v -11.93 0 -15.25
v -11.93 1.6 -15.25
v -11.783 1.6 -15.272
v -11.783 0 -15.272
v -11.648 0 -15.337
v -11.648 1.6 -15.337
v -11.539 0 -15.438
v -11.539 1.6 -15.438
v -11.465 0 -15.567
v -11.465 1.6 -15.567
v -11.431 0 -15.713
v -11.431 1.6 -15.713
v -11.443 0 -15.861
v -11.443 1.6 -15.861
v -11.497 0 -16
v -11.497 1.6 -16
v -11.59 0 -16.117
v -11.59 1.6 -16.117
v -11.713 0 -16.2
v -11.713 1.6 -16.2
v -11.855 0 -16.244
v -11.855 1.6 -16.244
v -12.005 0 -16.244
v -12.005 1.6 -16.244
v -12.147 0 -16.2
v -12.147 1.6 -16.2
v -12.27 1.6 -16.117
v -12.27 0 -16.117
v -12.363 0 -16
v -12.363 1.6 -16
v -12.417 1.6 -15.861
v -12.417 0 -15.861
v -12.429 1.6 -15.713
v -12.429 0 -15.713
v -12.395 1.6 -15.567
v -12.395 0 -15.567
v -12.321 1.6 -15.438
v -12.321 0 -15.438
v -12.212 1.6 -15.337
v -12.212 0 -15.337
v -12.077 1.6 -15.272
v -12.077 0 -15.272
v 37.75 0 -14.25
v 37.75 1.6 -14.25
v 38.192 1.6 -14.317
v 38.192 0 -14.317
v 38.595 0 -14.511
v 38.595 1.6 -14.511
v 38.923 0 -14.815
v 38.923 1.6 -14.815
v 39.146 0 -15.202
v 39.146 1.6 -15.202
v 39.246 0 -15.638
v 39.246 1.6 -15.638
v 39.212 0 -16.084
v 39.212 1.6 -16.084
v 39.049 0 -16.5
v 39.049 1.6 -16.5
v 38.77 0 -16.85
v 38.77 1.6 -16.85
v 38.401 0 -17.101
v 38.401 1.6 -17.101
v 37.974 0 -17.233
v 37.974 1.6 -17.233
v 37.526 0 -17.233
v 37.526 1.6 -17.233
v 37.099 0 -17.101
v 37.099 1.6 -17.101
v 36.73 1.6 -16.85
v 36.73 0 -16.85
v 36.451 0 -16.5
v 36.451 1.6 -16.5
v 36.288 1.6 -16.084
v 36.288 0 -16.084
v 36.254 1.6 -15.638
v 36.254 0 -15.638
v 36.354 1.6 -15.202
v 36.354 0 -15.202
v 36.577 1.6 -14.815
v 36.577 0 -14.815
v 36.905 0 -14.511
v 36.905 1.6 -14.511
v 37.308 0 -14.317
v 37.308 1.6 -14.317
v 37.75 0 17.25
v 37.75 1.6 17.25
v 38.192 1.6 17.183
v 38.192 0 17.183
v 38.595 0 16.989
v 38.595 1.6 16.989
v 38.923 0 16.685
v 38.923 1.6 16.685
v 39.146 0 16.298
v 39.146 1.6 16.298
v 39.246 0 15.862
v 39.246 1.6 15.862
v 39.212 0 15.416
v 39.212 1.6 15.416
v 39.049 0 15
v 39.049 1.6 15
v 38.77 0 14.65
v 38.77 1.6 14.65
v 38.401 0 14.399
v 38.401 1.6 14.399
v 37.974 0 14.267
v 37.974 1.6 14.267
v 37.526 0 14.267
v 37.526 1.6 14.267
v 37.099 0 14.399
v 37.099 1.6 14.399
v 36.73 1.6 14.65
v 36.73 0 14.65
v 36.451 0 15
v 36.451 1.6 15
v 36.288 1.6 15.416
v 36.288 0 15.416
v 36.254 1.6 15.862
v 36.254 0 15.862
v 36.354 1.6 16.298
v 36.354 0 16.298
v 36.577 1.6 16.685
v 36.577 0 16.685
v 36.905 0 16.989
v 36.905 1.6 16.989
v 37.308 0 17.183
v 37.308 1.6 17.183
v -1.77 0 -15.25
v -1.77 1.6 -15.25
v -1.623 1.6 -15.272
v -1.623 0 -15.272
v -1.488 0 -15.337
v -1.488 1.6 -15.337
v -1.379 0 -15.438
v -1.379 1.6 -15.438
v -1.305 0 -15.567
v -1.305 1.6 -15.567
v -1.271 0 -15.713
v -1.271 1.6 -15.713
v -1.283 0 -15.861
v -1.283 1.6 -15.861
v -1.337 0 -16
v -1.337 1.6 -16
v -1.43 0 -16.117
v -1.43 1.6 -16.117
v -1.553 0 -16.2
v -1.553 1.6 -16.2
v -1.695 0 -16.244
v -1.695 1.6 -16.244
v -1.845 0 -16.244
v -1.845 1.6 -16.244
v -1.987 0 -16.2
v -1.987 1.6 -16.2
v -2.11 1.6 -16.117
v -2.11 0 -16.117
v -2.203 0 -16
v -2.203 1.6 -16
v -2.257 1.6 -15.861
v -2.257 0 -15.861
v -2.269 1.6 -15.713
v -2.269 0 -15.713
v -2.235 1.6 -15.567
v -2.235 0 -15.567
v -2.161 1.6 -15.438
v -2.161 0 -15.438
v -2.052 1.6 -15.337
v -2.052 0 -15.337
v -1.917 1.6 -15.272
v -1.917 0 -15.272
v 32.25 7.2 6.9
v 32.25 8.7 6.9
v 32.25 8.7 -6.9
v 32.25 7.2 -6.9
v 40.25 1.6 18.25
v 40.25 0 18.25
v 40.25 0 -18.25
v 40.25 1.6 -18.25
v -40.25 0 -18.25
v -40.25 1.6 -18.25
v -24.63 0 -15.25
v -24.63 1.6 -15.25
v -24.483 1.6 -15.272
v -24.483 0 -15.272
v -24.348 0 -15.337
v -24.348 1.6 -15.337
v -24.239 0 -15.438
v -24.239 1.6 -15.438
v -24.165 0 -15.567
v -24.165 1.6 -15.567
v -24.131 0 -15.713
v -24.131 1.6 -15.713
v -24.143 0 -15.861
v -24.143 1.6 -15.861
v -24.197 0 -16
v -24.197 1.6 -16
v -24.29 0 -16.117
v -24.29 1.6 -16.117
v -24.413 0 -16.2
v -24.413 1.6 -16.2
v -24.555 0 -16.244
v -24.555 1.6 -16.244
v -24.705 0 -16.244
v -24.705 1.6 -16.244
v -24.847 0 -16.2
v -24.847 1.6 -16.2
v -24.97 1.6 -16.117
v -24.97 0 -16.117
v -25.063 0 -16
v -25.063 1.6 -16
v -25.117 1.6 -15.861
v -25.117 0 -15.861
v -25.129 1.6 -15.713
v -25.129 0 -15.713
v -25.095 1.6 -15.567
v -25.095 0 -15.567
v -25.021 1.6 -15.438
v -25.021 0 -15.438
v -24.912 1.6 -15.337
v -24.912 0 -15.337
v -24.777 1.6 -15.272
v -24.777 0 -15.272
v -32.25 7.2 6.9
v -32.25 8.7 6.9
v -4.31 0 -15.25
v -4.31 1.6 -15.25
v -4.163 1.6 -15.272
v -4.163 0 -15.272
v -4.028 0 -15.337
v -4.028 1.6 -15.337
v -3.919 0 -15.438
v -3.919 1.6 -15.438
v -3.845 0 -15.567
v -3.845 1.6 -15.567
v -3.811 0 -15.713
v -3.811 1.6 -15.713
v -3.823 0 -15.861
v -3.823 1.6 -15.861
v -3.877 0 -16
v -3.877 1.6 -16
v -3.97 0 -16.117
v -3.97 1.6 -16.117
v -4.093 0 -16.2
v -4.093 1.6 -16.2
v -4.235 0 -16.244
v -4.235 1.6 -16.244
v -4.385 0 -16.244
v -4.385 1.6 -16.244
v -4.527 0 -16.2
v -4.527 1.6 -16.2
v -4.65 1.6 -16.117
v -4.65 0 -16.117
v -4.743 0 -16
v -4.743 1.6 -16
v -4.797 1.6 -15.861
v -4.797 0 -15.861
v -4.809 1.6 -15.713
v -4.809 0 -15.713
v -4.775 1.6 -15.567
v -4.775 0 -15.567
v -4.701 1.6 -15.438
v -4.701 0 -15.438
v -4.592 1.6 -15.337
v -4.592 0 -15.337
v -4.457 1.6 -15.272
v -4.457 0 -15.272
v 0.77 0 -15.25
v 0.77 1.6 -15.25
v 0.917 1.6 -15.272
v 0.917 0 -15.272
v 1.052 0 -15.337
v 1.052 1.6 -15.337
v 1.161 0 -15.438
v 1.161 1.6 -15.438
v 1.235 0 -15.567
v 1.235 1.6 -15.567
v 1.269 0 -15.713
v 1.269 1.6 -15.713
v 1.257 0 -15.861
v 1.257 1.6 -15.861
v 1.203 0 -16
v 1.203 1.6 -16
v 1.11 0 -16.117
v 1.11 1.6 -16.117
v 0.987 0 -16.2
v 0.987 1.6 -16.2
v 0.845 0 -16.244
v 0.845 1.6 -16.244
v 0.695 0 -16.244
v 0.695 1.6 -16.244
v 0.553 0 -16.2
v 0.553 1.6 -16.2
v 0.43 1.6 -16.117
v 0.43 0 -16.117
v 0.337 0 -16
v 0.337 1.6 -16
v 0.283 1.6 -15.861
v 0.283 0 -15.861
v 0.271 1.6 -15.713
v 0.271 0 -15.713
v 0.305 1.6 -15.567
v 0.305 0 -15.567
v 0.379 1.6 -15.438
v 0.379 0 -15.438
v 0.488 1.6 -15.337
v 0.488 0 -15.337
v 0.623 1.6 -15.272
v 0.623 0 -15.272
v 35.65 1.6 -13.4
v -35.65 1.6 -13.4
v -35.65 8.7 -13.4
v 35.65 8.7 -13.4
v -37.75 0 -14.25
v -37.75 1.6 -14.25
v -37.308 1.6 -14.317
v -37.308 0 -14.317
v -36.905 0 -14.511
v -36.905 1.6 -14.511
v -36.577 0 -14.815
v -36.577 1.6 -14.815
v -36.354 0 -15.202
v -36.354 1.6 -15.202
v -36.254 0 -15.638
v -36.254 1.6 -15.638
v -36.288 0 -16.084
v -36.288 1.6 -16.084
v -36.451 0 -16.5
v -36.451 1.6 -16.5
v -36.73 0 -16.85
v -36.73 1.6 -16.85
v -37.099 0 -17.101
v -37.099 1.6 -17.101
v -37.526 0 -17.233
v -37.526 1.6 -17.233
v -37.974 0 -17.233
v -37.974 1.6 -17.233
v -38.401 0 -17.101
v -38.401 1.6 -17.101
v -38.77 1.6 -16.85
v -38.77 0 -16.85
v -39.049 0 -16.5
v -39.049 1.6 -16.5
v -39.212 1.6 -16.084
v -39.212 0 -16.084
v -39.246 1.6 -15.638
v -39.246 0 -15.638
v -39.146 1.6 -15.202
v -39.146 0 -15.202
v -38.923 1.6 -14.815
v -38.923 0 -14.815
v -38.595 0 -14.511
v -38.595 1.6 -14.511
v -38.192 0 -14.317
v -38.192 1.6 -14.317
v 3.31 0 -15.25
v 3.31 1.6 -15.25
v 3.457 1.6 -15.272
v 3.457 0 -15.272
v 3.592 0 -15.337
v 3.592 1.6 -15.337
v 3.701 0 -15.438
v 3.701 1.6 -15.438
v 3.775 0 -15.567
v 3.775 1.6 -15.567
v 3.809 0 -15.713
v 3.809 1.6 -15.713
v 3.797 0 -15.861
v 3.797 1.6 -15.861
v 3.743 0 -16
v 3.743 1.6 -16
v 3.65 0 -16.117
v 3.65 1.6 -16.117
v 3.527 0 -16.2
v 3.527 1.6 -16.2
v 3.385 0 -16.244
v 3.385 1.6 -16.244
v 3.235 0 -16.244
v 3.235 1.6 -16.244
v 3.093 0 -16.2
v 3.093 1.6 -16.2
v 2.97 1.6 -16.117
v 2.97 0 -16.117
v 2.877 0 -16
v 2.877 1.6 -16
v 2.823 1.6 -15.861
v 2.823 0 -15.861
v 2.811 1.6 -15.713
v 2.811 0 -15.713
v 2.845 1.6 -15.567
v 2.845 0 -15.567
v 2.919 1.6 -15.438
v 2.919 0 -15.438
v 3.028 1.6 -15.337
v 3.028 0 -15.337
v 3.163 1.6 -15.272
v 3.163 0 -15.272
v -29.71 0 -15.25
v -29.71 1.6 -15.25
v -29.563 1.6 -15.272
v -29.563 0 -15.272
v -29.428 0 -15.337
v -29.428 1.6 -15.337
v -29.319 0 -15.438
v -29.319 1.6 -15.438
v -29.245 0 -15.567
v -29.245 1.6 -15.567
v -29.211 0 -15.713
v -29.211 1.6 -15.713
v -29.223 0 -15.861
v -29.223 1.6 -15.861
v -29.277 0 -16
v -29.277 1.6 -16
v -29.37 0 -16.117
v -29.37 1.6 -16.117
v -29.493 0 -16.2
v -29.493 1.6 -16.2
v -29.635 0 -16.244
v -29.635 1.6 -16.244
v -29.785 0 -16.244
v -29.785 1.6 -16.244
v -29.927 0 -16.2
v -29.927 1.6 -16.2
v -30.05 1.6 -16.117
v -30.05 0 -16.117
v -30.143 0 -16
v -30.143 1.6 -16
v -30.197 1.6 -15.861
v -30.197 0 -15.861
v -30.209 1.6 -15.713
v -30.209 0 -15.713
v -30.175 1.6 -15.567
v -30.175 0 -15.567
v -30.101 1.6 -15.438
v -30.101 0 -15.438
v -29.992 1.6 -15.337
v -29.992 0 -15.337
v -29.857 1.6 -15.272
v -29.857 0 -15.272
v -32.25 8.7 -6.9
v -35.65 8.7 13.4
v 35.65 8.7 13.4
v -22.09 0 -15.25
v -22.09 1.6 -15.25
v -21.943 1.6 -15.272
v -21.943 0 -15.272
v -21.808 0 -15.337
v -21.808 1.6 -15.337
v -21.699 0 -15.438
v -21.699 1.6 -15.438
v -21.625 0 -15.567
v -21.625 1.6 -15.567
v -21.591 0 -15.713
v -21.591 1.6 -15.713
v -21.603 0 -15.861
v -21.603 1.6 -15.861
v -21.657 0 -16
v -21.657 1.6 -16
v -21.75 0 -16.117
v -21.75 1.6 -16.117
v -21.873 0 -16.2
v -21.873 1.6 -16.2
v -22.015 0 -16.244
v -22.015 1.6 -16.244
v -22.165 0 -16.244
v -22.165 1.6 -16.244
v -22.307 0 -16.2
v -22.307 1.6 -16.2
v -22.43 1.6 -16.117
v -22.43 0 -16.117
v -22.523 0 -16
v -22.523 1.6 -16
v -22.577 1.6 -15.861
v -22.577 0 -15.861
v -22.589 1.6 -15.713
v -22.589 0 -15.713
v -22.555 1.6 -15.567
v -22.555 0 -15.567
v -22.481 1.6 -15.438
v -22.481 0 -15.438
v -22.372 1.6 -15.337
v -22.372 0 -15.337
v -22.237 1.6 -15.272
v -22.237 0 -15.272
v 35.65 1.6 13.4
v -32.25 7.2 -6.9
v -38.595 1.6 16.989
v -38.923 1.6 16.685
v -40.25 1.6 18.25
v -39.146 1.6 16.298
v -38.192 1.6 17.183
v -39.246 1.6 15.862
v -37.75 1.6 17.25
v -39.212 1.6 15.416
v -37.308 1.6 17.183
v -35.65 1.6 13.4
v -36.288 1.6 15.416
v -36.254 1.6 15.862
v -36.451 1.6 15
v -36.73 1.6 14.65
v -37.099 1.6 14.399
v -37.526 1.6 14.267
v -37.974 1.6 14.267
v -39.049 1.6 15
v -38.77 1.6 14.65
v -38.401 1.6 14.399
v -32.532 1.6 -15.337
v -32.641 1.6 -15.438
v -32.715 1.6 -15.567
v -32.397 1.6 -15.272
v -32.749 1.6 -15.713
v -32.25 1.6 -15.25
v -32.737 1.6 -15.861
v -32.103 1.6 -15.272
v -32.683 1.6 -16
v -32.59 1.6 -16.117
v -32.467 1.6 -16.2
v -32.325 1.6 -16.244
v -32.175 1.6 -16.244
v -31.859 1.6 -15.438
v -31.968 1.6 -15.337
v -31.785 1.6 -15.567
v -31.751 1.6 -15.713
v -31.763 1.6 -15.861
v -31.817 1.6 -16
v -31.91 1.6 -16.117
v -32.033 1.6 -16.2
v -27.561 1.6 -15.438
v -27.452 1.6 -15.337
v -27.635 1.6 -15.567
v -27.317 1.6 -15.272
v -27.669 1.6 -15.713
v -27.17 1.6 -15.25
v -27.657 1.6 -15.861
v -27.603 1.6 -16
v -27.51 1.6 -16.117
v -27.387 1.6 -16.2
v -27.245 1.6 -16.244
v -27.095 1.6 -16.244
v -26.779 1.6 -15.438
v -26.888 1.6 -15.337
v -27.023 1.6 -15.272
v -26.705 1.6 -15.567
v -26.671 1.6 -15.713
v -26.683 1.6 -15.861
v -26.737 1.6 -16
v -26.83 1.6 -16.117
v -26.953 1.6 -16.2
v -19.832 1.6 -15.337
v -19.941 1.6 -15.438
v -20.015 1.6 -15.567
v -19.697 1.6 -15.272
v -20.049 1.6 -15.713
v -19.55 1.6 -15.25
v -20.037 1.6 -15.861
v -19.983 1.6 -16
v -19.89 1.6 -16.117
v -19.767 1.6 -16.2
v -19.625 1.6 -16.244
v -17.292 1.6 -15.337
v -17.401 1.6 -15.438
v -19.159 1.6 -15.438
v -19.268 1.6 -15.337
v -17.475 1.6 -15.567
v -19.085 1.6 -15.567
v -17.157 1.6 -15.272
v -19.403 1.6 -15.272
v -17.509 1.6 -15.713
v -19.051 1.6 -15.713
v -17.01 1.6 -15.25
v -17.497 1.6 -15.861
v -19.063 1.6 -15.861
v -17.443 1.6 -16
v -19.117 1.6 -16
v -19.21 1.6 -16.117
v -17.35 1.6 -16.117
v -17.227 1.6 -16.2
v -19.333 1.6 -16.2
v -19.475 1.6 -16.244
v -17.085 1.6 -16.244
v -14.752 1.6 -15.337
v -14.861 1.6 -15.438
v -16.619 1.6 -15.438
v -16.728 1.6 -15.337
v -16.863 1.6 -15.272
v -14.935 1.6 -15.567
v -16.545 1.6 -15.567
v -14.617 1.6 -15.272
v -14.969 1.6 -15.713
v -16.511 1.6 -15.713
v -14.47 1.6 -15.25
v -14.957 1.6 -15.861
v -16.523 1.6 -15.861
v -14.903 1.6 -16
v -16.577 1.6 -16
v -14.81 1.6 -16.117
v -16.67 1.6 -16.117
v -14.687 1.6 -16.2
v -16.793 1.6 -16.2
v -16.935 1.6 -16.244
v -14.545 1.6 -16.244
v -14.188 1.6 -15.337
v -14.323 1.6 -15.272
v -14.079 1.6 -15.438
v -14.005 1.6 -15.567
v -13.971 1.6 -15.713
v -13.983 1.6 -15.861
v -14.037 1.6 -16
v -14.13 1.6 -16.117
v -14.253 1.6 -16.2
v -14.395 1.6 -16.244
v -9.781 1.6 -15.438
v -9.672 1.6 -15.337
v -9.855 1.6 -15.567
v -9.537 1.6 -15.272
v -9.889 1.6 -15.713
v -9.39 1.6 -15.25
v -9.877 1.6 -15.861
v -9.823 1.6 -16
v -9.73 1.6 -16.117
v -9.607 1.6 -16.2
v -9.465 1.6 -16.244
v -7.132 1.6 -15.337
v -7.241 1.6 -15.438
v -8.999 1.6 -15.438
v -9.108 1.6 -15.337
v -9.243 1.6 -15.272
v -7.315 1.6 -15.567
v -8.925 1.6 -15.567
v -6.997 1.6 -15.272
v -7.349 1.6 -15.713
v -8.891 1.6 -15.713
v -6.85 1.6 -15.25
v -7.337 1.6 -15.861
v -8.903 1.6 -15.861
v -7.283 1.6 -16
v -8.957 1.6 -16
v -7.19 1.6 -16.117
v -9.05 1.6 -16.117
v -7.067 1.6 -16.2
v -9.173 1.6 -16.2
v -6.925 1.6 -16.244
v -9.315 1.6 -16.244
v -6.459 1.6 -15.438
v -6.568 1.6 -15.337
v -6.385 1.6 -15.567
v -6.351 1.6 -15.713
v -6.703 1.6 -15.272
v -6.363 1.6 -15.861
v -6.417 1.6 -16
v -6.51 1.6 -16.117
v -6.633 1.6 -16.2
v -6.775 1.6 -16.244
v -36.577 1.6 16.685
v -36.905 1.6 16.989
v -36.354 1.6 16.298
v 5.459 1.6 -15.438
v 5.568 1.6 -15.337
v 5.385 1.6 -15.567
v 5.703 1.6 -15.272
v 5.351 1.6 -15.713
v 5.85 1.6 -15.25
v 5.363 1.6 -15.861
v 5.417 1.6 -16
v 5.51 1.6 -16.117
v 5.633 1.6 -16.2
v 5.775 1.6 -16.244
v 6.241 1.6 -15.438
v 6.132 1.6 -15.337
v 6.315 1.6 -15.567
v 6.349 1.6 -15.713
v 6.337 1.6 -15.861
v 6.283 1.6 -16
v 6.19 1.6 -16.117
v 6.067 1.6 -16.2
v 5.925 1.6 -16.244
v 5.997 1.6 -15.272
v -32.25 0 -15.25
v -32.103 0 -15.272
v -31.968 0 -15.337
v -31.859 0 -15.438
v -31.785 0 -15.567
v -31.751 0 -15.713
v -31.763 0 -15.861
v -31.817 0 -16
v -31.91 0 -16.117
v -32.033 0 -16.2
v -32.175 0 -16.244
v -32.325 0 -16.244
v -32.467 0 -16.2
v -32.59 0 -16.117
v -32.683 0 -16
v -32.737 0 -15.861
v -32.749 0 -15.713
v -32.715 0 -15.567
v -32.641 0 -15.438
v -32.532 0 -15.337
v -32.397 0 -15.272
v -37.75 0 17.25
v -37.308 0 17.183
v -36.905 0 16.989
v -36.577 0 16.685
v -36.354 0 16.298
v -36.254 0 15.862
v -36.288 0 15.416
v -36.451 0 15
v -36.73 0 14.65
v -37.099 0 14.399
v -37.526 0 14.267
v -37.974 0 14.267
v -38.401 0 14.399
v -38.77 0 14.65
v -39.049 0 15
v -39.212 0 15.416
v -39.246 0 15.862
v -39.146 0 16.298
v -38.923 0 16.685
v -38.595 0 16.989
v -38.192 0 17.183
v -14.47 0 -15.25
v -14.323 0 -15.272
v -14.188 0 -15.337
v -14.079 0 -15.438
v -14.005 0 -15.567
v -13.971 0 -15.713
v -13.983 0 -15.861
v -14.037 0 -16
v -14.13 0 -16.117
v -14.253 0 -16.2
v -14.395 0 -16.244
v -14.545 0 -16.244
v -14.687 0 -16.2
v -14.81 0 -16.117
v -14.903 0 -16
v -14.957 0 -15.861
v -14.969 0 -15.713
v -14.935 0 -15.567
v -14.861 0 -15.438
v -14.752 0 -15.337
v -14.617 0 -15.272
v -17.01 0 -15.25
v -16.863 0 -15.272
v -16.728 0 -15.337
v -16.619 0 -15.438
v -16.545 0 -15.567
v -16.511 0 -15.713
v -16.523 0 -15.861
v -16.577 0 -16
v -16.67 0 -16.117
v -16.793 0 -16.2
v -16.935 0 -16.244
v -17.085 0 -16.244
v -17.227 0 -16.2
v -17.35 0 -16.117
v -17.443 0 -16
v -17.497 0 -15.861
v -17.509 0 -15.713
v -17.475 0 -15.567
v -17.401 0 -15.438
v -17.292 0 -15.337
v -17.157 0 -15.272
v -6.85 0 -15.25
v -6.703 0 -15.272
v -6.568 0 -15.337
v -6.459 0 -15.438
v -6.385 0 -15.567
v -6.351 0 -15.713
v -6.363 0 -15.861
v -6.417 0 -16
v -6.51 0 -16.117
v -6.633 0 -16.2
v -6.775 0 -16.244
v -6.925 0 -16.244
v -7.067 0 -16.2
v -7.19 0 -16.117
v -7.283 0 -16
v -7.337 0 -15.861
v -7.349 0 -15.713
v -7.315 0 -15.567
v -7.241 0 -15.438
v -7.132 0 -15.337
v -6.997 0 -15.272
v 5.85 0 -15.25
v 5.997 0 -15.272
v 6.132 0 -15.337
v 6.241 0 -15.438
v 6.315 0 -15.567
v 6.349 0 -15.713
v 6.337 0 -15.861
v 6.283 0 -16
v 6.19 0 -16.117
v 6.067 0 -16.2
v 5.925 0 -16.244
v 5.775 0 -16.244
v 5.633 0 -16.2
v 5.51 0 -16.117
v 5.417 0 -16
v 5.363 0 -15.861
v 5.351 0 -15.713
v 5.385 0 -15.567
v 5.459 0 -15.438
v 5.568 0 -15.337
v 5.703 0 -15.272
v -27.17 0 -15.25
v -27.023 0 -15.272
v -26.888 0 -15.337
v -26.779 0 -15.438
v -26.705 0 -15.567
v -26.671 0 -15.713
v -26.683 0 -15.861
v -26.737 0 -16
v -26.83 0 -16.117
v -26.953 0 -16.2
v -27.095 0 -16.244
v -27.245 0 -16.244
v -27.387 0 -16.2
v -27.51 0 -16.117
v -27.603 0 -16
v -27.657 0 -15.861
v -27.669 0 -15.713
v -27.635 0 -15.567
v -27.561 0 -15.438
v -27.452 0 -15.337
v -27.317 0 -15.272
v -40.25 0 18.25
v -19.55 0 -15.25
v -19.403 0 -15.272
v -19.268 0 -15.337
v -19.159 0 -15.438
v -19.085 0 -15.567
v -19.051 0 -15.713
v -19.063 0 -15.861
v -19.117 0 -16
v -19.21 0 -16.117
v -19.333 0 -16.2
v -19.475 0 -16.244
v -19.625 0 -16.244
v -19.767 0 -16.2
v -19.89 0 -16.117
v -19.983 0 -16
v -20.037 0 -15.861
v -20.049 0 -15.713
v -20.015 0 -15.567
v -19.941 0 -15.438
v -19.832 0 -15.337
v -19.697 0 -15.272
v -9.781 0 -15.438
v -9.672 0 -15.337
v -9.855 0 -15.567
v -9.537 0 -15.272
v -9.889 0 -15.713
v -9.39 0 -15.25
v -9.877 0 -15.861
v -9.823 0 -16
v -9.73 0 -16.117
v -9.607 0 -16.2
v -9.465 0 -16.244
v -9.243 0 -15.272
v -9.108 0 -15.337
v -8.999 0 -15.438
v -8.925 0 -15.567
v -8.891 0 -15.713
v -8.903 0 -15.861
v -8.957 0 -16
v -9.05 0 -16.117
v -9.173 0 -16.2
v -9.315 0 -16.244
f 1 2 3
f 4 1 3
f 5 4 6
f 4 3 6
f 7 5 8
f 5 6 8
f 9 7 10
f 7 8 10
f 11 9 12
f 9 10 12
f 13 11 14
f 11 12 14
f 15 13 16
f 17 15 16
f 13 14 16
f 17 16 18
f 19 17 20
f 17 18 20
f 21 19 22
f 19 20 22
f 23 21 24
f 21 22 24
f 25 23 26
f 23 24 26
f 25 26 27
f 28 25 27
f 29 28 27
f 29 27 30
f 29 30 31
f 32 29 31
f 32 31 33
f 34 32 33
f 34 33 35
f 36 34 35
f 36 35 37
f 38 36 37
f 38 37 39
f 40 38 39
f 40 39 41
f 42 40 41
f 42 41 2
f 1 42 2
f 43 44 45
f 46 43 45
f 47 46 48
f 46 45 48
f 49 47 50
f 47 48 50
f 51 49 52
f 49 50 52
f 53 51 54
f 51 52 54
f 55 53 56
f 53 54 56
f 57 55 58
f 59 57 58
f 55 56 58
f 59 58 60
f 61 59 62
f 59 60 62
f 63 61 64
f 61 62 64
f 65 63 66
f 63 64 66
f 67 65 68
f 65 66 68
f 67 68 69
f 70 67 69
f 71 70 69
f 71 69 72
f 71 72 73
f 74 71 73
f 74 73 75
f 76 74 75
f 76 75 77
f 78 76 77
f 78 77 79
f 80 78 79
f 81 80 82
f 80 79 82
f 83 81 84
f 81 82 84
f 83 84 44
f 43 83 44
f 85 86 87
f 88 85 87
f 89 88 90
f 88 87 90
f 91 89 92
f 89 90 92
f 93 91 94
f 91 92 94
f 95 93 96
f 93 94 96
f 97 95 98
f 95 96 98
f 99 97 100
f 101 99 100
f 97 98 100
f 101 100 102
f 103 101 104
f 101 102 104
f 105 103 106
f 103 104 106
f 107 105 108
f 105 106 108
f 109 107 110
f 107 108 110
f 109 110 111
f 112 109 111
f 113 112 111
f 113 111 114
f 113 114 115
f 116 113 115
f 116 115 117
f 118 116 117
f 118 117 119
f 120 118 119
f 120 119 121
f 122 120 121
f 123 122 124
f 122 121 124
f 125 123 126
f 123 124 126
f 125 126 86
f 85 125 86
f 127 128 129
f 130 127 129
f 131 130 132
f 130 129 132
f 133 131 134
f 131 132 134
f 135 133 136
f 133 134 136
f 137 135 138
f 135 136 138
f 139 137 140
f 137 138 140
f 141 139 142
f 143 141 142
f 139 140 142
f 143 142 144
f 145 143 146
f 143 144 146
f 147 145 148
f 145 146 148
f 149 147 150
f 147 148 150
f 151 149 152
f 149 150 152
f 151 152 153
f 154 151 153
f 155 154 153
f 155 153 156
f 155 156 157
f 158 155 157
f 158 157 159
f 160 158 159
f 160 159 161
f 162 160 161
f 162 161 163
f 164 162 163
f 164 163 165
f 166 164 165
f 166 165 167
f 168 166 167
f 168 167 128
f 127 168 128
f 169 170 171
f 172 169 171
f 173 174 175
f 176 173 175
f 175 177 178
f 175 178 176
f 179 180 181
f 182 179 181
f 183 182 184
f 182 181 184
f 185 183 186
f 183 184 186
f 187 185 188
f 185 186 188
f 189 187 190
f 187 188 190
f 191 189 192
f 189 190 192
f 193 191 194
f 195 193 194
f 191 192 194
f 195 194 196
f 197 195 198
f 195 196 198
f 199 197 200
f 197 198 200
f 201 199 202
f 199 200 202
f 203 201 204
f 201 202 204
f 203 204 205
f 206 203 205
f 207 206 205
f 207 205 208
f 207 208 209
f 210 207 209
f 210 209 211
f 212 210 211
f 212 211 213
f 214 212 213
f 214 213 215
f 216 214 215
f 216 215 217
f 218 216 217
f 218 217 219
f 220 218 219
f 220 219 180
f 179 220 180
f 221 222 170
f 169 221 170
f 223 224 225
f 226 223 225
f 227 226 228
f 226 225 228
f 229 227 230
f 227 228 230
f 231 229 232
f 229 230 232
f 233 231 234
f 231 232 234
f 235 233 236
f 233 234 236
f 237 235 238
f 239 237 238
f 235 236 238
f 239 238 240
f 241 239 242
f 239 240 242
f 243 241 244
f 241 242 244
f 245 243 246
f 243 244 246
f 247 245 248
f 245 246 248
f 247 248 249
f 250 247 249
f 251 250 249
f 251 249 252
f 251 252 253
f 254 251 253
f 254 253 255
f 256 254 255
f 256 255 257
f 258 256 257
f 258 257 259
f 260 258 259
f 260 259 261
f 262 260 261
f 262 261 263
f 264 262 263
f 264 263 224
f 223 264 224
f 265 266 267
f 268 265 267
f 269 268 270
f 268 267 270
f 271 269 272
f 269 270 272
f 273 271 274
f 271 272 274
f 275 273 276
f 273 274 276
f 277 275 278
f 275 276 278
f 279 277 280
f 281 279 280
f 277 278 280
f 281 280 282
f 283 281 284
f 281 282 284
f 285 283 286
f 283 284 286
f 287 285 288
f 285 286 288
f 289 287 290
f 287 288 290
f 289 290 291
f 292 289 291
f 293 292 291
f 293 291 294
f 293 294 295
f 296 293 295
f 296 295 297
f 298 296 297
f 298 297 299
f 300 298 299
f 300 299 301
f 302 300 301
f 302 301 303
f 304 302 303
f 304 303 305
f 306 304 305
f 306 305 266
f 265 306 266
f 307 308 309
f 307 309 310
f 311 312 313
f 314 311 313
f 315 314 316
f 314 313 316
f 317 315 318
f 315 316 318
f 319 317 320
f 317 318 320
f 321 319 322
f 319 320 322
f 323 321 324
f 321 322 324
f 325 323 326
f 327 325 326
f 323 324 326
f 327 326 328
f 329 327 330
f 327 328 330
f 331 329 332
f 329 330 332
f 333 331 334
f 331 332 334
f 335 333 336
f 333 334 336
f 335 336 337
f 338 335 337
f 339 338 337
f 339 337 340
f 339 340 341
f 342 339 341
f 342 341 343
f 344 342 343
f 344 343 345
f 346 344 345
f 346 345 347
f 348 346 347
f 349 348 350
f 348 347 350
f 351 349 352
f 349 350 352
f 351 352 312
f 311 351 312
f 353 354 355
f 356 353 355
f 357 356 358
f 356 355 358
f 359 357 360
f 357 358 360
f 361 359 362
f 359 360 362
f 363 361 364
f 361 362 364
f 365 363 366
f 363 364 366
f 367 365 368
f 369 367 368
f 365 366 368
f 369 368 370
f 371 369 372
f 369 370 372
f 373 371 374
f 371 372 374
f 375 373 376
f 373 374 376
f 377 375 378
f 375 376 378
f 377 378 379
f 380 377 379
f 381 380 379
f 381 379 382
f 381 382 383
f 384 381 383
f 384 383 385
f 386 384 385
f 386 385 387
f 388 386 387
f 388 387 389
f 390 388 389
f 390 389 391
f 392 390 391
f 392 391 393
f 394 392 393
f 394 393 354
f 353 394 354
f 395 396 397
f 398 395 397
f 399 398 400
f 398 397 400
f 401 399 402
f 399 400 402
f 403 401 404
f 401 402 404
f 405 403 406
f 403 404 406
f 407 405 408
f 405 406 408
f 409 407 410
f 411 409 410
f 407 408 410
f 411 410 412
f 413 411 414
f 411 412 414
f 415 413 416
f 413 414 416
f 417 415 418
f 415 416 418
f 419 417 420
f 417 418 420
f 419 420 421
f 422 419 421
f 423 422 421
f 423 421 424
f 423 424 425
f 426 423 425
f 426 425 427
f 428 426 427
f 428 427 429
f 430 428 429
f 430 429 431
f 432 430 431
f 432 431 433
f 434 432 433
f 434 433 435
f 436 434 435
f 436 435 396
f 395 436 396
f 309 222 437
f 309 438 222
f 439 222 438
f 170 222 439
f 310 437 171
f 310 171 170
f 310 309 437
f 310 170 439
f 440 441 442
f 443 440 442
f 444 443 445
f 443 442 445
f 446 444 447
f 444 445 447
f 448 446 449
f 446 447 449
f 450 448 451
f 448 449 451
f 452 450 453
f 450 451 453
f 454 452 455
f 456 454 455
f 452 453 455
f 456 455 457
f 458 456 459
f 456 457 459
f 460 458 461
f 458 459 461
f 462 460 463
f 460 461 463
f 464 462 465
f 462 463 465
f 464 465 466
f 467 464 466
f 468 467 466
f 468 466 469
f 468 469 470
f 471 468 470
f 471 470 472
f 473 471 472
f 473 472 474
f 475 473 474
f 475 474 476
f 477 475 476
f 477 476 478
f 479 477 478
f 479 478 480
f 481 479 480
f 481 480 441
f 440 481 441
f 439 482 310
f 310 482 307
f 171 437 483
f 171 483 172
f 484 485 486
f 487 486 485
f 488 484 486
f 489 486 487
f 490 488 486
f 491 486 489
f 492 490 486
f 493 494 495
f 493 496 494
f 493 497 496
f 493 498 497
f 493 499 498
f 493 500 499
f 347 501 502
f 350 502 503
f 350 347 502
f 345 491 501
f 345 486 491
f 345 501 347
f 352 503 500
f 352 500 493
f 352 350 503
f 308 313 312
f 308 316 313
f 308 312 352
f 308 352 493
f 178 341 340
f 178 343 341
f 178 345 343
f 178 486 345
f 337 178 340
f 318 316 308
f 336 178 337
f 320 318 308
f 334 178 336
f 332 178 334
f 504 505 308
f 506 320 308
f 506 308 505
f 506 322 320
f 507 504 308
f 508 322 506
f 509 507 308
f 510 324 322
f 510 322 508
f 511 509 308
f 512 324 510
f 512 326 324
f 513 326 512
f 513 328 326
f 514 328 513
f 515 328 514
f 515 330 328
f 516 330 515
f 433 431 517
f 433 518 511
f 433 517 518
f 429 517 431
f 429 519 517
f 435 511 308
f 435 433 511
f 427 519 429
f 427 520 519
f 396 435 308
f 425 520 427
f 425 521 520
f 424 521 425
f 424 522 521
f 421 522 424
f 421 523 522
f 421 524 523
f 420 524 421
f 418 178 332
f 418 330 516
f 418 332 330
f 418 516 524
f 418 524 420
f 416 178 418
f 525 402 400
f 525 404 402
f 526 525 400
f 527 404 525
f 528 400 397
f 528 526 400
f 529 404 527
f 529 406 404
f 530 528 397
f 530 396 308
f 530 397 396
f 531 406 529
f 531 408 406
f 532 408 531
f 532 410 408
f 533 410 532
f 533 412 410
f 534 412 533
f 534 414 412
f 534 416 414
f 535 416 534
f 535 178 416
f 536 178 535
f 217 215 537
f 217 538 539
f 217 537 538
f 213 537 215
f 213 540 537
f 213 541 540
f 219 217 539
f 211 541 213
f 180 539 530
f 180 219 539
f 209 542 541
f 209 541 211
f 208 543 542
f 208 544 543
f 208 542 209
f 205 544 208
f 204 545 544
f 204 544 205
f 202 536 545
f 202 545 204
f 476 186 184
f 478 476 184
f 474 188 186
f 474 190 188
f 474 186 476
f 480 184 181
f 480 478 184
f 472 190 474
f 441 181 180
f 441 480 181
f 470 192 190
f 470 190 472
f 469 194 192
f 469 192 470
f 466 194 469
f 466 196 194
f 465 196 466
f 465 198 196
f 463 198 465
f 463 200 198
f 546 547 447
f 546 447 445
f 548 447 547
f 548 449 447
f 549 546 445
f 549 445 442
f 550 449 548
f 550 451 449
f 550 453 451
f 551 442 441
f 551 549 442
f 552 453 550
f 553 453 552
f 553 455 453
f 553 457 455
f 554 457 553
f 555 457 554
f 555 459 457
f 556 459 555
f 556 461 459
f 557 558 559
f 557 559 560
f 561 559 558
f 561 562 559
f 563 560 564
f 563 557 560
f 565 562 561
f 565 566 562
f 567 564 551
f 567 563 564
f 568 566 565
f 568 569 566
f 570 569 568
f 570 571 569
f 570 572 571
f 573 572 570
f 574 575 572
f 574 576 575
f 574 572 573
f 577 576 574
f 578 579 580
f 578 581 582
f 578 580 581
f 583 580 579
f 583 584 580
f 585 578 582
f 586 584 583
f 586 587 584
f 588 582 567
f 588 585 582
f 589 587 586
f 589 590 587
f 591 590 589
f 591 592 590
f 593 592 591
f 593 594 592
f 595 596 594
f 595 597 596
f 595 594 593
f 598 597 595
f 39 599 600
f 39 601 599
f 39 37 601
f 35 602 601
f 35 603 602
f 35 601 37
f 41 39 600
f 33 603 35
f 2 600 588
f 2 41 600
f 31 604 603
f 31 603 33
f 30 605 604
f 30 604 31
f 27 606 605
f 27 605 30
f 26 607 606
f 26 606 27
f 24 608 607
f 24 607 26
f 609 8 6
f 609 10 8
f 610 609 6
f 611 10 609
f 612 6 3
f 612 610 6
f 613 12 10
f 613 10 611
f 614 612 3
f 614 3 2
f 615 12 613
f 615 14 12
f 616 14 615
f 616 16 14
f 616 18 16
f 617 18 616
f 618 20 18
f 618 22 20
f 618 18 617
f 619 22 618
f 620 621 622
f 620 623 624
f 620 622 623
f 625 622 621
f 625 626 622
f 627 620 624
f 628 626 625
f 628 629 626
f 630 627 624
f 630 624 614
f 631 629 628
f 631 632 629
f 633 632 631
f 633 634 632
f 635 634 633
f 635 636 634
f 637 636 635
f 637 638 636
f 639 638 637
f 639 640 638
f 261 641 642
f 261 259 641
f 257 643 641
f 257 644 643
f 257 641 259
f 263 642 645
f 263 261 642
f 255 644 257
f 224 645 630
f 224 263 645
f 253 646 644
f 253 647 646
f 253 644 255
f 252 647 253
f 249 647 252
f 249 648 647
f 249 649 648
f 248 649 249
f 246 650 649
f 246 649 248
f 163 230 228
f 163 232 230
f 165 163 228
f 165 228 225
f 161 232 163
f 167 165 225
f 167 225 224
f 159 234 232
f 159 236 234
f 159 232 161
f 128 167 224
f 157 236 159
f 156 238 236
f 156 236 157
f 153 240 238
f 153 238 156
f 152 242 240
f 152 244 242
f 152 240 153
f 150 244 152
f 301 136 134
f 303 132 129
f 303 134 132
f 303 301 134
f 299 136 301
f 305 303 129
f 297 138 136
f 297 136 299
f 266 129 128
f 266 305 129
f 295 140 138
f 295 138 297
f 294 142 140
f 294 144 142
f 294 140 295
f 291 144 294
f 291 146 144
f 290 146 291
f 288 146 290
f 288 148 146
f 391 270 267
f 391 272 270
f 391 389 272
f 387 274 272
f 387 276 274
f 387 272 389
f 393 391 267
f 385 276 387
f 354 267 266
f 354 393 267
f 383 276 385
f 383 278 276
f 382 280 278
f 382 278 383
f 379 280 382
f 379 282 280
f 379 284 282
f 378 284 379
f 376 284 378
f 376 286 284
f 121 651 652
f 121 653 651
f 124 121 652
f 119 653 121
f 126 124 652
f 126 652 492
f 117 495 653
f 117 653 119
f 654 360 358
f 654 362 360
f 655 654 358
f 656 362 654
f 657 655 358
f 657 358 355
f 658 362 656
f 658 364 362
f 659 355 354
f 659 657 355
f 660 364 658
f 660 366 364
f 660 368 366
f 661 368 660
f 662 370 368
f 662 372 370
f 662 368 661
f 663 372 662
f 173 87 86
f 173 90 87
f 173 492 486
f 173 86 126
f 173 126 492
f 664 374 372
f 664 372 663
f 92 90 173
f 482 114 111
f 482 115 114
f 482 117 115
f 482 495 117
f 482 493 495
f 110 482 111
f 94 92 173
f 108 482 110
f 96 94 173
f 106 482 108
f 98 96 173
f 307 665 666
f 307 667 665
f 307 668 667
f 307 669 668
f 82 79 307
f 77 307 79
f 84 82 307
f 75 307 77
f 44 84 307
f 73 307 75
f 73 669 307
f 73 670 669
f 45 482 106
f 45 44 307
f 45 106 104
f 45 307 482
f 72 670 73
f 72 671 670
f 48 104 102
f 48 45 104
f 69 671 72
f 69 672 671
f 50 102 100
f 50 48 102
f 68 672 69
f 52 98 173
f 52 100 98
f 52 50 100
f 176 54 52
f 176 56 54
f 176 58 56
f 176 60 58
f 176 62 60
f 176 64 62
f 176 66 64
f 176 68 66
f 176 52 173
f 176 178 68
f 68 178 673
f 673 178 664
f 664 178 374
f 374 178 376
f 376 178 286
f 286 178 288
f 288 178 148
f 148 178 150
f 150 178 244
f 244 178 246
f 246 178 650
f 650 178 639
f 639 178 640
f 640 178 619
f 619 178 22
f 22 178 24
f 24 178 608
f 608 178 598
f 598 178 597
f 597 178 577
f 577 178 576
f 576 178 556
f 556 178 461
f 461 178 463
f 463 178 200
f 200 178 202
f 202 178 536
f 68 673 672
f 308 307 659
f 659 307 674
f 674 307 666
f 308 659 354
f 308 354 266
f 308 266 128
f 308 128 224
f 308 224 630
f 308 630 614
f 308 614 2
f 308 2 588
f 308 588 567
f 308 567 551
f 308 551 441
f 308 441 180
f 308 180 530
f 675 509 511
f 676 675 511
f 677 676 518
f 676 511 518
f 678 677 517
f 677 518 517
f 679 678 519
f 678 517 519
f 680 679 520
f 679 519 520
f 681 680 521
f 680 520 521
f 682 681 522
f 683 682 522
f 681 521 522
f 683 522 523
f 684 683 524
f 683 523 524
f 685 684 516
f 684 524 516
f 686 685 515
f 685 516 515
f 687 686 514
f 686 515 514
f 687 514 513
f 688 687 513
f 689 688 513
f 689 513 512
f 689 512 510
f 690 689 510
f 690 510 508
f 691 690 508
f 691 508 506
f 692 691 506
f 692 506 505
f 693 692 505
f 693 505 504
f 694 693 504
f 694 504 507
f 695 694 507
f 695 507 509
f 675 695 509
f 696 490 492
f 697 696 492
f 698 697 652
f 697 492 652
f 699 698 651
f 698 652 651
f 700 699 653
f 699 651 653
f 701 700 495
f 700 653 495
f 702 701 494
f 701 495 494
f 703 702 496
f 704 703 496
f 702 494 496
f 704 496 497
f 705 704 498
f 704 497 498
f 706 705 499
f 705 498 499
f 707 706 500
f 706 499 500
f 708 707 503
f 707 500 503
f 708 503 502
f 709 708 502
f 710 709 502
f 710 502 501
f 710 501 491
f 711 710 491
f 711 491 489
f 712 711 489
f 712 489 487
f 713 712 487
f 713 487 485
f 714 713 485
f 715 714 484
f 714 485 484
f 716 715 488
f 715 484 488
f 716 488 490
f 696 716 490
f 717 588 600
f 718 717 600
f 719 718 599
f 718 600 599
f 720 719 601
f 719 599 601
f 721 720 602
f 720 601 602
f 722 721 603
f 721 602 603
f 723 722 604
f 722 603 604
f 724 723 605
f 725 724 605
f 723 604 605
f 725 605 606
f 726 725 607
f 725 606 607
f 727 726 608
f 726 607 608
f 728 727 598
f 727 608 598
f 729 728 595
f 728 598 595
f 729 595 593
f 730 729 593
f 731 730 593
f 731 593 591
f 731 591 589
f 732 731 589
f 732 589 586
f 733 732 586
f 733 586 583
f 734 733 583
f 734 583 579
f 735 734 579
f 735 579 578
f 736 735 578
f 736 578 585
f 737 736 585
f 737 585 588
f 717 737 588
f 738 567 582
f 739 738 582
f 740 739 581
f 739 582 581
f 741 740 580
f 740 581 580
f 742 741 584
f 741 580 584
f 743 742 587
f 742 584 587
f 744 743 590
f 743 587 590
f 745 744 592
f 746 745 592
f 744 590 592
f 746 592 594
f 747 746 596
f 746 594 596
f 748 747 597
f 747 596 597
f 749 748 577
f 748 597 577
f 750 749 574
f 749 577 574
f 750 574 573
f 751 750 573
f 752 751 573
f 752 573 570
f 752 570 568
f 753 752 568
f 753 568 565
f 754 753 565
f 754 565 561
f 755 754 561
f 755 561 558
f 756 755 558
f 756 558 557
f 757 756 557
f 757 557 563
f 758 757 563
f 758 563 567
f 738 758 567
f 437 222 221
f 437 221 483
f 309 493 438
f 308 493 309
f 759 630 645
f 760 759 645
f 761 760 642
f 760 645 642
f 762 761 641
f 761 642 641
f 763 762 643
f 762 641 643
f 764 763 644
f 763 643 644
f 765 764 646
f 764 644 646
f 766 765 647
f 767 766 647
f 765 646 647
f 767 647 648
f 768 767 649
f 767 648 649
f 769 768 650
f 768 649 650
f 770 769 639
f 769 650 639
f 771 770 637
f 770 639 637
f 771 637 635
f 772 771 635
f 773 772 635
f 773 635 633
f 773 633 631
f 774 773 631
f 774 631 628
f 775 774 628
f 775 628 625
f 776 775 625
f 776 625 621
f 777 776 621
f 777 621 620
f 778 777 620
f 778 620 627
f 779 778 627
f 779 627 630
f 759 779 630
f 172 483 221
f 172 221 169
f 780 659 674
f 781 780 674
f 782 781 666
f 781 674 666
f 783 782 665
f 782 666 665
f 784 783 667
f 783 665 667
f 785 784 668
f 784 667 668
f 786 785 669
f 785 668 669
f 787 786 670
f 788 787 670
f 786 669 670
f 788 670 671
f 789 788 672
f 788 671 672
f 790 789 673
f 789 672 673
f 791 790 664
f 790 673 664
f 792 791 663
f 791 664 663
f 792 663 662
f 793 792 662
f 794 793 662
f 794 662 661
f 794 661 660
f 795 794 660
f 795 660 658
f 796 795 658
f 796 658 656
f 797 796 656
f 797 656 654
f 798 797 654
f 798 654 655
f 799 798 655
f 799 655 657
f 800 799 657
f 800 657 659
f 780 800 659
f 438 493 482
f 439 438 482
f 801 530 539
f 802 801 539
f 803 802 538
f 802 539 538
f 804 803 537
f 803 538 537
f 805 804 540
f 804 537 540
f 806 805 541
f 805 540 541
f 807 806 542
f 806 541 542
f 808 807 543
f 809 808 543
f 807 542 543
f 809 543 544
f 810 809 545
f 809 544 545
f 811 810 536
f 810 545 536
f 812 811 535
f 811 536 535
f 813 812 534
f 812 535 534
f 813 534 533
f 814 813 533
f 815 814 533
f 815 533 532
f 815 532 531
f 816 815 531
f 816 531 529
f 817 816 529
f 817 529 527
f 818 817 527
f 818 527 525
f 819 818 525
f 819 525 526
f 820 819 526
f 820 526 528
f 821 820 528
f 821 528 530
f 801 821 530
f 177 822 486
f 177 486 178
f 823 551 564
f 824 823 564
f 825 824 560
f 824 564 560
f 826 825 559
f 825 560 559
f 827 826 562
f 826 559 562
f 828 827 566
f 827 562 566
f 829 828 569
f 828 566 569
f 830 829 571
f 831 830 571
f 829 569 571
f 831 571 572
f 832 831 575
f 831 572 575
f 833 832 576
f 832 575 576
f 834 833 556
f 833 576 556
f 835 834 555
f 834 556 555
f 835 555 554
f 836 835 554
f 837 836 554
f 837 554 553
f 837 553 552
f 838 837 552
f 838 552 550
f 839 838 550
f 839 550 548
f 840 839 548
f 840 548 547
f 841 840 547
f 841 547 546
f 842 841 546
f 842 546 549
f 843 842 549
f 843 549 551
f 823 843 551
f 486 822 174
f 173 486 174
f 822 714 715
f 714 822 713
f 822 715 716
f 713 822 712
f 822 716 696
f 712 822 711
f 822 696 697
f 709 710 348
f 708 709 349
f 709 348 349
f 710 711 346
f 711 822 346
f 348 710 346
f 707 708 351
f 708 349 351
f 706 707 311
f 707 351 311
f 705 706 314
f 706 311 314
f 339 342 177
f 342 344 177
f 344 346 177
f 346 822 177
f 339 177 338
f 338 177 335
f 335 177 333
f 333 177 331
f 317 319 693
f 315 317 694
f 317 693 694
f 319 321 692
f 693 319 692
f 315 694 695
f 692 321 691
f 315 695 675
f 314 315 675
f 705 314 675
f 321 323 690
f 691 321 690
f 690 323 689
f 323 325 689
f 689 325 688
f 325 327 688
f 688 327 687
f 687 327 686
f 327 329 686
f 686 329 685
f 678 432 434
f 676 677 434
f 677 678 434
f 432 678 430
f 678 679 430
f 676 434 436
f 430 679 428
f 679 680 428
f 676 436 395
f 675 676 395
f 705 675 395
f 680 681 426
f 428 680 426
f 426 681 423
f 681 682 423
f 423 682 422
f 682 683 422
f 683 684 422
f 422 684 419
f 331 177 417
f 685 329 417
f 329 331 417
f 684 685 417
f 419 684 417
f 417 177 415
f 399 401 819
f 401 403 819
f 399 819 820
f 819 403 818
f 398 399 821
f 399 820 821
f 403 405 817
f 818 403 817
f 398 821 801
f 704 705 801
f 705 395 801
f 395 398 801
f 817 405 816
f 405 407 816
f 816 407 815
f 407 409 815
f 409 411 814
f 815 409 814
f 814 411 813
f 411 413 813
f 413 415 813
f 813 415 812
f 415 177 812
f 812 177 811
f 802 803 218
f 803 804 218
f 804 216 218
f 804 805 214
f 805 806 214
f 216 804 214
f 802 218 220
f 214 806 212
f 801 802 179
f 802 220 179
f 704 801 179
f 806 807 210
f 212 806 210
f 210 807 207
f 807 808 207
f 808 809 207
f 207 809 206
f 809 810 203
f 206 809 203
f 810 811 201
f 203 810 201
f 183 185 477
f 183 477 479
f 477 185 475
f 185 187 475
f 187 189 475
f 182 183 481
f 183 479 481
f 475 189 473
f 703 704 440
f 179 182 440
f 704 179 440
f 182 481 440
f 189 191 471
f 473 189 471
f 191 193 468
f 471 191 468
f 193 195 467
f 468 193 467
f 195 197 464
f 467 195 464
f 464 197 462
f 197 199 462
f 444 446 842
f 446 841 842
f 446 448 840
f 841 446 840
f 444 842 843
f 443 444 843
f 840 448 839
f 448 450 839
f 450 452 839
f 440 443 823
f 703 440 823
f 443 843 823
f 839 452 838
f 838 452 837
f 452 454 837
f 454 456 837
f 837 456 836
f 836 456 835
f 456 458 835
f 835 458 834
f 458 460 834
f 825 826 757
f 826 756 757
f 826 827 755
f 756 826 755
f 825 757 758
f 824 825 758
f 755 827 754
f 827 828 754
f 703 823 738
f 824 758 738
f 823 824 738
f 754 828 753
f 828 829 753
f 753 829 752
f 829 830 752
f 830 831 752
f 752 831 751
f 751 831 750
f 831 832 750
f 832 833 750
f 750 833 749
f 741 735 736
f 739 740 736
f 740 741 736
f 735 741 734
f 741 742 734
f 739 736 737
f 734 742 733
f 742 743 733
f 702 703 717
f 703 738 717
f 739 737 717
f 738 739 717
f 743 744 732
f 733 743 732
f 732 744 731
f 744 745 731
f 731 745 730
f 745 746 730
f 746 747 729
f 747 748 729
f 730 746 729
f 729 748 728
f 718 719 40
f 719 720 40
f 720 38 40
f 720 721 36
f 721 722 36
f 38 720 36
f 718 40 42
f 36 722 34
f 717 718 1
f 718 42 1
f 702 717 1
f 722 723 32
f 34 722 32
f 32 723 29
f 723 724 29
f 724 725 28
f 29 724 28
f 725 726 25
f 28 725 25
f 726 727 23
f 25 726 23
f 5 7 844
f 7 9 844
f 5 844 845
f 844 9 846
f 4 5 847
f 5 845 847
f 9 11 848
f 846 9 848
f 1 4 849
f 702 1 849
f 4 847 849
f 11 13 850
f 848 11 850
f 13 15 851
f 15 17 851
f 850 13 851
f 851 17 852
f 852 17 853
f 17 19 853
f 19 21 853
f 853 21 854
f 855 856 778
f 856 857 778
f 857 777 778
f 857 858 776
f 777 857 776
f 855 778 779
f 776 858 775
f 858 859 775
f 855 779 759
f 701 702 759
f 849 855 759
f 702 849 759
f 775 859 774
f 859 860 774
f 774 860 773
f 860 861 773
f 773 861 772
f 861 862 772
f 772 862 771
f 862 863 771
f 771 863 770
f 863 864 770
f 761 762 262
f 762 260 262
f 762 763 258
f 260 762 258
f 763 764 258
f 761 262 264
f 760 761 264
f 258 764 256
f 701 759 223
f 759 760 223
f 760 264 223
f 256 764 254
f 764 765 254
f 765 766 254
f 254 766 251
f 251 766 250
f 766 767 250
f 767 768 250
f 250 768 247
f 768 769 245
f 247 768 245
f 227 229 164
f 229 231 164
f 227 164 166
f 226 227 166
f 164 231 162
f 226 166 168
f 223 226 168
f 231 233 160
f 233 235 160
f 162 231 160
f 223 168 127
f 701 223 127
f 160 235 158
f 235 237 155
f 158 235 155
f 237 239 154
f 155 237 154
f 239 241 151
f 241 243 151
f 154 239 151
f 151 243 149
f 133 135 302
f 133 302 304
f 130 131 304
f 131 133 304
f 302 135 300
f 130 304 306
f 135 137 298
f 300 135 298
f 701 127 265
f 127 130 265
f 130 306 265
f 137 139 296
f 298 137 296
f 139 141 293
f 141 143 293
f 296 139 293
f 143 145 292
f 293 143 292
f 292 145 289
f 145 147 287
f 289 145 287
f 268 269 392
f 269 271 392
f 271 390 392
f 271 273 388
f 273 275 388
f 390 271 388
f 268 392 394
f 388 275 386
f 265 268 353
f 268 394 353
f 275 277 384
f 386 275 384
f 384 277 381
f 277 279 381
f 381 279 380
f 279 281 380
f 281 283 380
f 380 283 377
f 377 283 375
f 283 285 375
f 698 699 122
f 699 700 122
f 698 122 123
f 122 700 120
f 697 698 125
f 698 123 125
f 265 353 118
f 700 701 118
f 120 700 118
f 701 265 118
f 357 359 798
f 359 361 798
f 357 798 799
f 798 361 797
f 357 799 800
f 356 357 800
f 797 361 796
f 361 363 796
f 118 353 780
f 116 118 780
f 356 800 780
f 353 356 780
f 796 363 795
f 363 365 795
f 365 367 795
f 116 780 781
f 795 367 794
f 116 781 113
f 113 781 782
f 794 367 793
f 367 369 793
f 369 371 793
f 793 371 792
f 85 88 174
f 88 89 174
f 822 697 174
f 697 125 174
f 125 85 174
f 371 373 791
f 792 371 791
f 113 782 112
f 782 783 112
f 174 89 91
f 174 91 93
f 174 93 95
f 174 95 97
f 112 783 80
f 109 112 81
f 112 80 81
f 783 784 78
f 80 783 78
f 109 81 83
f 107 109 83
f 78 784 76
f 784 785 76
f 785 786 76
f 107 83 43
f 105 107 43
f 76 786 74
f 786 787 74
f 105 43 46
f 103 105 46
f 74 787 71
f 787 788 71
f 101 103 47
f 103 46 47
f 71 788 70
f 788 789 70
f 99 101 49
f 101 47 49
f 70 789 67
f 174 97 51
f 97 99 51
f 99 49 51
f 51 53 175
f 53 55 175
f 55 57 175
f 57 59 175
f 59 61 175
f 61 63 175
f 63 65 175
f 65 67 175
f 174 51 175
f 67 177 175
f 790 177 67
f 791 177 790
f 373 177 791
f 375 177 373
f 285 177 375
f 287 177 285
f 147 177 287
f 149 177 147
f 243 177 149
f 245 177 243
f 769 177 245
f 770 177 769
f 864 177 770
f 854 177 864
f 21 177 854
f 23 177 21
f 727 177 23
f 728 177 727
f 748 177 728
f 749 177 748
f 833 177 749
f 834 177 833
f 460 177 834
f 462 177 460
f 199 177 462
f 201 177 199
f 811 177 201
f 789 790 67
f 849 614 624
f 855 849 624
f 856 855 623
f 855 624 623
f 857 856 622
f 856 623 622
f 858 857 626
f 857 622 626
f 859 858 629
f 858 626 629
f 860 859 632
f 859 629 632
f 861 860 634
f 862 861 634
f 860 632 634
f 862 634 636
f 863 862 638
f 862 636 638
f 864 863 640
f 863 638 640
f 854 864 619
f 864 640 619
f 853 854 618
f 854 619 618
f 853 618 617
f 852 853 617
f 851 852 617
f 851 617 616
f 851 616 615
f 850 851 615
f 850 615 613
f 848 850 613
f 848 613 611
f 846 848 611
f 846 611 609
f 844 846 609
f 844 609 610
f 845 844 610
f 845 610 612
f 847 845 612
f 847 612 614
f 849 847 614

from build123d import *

# Parameters (mm, degrees)
SKETCH1_W           = 80.5
SKETCH1_H           = 36.5
BOSS_EXTRUDE1_DEPTH = 1.6
SKETCH2_R           = 1.5
CUT_EXTRUDE1_DEPTH  = 1.6
SKETCH3_W           = 71.3
SKETCH3_H           = 26.799999994
BOSS_EXTRUDE2_DEPTH = 7.1
SKETCH4_R           = 0.5
CUT_EXTRUDE2_DEPTH  = 7.1
SKETCH5_W           = 64.5
SKETCH5_H           = 13.8
CUT_EXTRUDE3_DEPTH  = 1.5


with BuildPart() as part:
    # Sketch1 → Boss-Extrude1 (new body)
    with BuildSketch(Plane(origin=(0, 0, 0), x_dir=(1, 0, 0), z_dir=(0, 1, 0))):
        Rectangle(SKETCH1_W, SKETCH1_H)
    extrude(amount=BOSS_EXTRUDE1_DEPTH)

    # Sketch2 → Cut-Extrude1 (cut)
    with BuildSketch(Plane(origin=(0, 1.6, 0), x_dir=(1, 0, 0), z_dir=(0, 1, 0))):
        with Locations(Location((-37.75, 15.75, 0), (0, 0, 270))):
            Circle(SKETCH2_R)
        with Locations(Location((-37.75, -15.75, 0), (0, 0, 270))):
            Circle(SKETCH2_R)
        with Locations(Location((37.75, 15.75, 0), (0, 0, 270))):
            Circle(SKETCH2_R)
        with Locations(Location((37.75, -15.75, 0), (0, 0, 270))):
            Circle(SKETCH2_R)
    extrude(amount=-CUT_EXTRUDE1_DEPTH, mode=Mode.SUBTRACT)

    # Sketch3 → Boss-Extrude2 (add)
    with BuildSketch(Plane(origin=(0, 1.6, 0), x_dir=(1, 0, 0), z_dir=(0, 1, 0))):
        Rectangle(SKETCH3_W, SKETCH3_H)
    extrude(amount=BOSS_EXTRUDE2_DEPTH)

    # Sketch4 → Cut-Extrude2 (cut)
    with BuildSketch(Plane(origin=(0, 1.6, 0), x_dir=(1, 0, 0), z_dir=(0, 1, 0))):
        with Locations(Location((-32.25, 15.75, 0), (0, 0, 270))):
            Circle(SKETCH4_R)
        with Locations(Location((-29.71, 15.75, 0), (0, 0, 270))):
            Circle(SKETCH4_R)
        with Locations(Location((-27.17, 15.75, 0), (0, 0, 270))):
            Circle(SKETCH4_R)
        with Locations(Location((-24.63, 15.75, 0), (0, 0, 270))):
            Circle(SKETCH4_R)
        with Locations(Location((-22.09, 15.75, 0), (0, 0, 270))):
            Circle(SKETCH4_R)
        with Locations(Location((-19.55, 15.75, 0), (0, 0, 270))):
            Circle(SKETCH4_R)
        with Locations(Location((-17.01, 15.75, 0), (0, 0, 270))):
            Circle(SKETCH4_R)
        with Locations(Location((-14.47, 15.75, 0), (0, 0, 270))):
            Circle(SKETCH4_R)
        with Locations(Location((-11.93, 15.75, 0), (0, 0, 270))):
            Circle(SKETCH4_R)
        with Locations(Location((-9.39, 15.75, 0), (0, 0, 270))):
            Circle(SKETCH4_R)
        with Locations(Location((-6.85, 15.75, 0), (0, 0, 270))):
            Circle(SKETCH4_R)
        with Locations(Location((-4.31, 15.75, 0), (0, 0, 270))):
            Circle(SKETCH4_R)
        with Locations(Location((-1.77, 15.75, 0), (0, 0, 270))):
            Circle(SKETCH4_R)
        with Locations(Location((0.77, 15.75, 0), (0, 0, 270))):
            Circle(SKETCH4_R)
        with Locations(Location((3.31, 15.75, 0), (0, 0, 270))):
            Circle(SKETCH4_R)
        with Locations(Location((5.85, 15.75, 0), (0, 0, 270))):
            Circle(SKETCH4_R)
    extrude(amount=-CUT_EXTRUDE2_DEPTH, mode=Mode.SUBTRACT)

    # Sketch5 → Cut-Extrude3 (cut)
    with BuildSketch(Plane(origin=(0, 8.7, 0), x_dir=(1, 0, 0), z_dir=(0, 1, 0))):
        Rectangle(SKETCH5_W, SKETCH5_H)
    extrude(amount=-CUT_EXTRUDE3_DEPTH, mode=Mode.SUBTRACT)


solid = part.part
